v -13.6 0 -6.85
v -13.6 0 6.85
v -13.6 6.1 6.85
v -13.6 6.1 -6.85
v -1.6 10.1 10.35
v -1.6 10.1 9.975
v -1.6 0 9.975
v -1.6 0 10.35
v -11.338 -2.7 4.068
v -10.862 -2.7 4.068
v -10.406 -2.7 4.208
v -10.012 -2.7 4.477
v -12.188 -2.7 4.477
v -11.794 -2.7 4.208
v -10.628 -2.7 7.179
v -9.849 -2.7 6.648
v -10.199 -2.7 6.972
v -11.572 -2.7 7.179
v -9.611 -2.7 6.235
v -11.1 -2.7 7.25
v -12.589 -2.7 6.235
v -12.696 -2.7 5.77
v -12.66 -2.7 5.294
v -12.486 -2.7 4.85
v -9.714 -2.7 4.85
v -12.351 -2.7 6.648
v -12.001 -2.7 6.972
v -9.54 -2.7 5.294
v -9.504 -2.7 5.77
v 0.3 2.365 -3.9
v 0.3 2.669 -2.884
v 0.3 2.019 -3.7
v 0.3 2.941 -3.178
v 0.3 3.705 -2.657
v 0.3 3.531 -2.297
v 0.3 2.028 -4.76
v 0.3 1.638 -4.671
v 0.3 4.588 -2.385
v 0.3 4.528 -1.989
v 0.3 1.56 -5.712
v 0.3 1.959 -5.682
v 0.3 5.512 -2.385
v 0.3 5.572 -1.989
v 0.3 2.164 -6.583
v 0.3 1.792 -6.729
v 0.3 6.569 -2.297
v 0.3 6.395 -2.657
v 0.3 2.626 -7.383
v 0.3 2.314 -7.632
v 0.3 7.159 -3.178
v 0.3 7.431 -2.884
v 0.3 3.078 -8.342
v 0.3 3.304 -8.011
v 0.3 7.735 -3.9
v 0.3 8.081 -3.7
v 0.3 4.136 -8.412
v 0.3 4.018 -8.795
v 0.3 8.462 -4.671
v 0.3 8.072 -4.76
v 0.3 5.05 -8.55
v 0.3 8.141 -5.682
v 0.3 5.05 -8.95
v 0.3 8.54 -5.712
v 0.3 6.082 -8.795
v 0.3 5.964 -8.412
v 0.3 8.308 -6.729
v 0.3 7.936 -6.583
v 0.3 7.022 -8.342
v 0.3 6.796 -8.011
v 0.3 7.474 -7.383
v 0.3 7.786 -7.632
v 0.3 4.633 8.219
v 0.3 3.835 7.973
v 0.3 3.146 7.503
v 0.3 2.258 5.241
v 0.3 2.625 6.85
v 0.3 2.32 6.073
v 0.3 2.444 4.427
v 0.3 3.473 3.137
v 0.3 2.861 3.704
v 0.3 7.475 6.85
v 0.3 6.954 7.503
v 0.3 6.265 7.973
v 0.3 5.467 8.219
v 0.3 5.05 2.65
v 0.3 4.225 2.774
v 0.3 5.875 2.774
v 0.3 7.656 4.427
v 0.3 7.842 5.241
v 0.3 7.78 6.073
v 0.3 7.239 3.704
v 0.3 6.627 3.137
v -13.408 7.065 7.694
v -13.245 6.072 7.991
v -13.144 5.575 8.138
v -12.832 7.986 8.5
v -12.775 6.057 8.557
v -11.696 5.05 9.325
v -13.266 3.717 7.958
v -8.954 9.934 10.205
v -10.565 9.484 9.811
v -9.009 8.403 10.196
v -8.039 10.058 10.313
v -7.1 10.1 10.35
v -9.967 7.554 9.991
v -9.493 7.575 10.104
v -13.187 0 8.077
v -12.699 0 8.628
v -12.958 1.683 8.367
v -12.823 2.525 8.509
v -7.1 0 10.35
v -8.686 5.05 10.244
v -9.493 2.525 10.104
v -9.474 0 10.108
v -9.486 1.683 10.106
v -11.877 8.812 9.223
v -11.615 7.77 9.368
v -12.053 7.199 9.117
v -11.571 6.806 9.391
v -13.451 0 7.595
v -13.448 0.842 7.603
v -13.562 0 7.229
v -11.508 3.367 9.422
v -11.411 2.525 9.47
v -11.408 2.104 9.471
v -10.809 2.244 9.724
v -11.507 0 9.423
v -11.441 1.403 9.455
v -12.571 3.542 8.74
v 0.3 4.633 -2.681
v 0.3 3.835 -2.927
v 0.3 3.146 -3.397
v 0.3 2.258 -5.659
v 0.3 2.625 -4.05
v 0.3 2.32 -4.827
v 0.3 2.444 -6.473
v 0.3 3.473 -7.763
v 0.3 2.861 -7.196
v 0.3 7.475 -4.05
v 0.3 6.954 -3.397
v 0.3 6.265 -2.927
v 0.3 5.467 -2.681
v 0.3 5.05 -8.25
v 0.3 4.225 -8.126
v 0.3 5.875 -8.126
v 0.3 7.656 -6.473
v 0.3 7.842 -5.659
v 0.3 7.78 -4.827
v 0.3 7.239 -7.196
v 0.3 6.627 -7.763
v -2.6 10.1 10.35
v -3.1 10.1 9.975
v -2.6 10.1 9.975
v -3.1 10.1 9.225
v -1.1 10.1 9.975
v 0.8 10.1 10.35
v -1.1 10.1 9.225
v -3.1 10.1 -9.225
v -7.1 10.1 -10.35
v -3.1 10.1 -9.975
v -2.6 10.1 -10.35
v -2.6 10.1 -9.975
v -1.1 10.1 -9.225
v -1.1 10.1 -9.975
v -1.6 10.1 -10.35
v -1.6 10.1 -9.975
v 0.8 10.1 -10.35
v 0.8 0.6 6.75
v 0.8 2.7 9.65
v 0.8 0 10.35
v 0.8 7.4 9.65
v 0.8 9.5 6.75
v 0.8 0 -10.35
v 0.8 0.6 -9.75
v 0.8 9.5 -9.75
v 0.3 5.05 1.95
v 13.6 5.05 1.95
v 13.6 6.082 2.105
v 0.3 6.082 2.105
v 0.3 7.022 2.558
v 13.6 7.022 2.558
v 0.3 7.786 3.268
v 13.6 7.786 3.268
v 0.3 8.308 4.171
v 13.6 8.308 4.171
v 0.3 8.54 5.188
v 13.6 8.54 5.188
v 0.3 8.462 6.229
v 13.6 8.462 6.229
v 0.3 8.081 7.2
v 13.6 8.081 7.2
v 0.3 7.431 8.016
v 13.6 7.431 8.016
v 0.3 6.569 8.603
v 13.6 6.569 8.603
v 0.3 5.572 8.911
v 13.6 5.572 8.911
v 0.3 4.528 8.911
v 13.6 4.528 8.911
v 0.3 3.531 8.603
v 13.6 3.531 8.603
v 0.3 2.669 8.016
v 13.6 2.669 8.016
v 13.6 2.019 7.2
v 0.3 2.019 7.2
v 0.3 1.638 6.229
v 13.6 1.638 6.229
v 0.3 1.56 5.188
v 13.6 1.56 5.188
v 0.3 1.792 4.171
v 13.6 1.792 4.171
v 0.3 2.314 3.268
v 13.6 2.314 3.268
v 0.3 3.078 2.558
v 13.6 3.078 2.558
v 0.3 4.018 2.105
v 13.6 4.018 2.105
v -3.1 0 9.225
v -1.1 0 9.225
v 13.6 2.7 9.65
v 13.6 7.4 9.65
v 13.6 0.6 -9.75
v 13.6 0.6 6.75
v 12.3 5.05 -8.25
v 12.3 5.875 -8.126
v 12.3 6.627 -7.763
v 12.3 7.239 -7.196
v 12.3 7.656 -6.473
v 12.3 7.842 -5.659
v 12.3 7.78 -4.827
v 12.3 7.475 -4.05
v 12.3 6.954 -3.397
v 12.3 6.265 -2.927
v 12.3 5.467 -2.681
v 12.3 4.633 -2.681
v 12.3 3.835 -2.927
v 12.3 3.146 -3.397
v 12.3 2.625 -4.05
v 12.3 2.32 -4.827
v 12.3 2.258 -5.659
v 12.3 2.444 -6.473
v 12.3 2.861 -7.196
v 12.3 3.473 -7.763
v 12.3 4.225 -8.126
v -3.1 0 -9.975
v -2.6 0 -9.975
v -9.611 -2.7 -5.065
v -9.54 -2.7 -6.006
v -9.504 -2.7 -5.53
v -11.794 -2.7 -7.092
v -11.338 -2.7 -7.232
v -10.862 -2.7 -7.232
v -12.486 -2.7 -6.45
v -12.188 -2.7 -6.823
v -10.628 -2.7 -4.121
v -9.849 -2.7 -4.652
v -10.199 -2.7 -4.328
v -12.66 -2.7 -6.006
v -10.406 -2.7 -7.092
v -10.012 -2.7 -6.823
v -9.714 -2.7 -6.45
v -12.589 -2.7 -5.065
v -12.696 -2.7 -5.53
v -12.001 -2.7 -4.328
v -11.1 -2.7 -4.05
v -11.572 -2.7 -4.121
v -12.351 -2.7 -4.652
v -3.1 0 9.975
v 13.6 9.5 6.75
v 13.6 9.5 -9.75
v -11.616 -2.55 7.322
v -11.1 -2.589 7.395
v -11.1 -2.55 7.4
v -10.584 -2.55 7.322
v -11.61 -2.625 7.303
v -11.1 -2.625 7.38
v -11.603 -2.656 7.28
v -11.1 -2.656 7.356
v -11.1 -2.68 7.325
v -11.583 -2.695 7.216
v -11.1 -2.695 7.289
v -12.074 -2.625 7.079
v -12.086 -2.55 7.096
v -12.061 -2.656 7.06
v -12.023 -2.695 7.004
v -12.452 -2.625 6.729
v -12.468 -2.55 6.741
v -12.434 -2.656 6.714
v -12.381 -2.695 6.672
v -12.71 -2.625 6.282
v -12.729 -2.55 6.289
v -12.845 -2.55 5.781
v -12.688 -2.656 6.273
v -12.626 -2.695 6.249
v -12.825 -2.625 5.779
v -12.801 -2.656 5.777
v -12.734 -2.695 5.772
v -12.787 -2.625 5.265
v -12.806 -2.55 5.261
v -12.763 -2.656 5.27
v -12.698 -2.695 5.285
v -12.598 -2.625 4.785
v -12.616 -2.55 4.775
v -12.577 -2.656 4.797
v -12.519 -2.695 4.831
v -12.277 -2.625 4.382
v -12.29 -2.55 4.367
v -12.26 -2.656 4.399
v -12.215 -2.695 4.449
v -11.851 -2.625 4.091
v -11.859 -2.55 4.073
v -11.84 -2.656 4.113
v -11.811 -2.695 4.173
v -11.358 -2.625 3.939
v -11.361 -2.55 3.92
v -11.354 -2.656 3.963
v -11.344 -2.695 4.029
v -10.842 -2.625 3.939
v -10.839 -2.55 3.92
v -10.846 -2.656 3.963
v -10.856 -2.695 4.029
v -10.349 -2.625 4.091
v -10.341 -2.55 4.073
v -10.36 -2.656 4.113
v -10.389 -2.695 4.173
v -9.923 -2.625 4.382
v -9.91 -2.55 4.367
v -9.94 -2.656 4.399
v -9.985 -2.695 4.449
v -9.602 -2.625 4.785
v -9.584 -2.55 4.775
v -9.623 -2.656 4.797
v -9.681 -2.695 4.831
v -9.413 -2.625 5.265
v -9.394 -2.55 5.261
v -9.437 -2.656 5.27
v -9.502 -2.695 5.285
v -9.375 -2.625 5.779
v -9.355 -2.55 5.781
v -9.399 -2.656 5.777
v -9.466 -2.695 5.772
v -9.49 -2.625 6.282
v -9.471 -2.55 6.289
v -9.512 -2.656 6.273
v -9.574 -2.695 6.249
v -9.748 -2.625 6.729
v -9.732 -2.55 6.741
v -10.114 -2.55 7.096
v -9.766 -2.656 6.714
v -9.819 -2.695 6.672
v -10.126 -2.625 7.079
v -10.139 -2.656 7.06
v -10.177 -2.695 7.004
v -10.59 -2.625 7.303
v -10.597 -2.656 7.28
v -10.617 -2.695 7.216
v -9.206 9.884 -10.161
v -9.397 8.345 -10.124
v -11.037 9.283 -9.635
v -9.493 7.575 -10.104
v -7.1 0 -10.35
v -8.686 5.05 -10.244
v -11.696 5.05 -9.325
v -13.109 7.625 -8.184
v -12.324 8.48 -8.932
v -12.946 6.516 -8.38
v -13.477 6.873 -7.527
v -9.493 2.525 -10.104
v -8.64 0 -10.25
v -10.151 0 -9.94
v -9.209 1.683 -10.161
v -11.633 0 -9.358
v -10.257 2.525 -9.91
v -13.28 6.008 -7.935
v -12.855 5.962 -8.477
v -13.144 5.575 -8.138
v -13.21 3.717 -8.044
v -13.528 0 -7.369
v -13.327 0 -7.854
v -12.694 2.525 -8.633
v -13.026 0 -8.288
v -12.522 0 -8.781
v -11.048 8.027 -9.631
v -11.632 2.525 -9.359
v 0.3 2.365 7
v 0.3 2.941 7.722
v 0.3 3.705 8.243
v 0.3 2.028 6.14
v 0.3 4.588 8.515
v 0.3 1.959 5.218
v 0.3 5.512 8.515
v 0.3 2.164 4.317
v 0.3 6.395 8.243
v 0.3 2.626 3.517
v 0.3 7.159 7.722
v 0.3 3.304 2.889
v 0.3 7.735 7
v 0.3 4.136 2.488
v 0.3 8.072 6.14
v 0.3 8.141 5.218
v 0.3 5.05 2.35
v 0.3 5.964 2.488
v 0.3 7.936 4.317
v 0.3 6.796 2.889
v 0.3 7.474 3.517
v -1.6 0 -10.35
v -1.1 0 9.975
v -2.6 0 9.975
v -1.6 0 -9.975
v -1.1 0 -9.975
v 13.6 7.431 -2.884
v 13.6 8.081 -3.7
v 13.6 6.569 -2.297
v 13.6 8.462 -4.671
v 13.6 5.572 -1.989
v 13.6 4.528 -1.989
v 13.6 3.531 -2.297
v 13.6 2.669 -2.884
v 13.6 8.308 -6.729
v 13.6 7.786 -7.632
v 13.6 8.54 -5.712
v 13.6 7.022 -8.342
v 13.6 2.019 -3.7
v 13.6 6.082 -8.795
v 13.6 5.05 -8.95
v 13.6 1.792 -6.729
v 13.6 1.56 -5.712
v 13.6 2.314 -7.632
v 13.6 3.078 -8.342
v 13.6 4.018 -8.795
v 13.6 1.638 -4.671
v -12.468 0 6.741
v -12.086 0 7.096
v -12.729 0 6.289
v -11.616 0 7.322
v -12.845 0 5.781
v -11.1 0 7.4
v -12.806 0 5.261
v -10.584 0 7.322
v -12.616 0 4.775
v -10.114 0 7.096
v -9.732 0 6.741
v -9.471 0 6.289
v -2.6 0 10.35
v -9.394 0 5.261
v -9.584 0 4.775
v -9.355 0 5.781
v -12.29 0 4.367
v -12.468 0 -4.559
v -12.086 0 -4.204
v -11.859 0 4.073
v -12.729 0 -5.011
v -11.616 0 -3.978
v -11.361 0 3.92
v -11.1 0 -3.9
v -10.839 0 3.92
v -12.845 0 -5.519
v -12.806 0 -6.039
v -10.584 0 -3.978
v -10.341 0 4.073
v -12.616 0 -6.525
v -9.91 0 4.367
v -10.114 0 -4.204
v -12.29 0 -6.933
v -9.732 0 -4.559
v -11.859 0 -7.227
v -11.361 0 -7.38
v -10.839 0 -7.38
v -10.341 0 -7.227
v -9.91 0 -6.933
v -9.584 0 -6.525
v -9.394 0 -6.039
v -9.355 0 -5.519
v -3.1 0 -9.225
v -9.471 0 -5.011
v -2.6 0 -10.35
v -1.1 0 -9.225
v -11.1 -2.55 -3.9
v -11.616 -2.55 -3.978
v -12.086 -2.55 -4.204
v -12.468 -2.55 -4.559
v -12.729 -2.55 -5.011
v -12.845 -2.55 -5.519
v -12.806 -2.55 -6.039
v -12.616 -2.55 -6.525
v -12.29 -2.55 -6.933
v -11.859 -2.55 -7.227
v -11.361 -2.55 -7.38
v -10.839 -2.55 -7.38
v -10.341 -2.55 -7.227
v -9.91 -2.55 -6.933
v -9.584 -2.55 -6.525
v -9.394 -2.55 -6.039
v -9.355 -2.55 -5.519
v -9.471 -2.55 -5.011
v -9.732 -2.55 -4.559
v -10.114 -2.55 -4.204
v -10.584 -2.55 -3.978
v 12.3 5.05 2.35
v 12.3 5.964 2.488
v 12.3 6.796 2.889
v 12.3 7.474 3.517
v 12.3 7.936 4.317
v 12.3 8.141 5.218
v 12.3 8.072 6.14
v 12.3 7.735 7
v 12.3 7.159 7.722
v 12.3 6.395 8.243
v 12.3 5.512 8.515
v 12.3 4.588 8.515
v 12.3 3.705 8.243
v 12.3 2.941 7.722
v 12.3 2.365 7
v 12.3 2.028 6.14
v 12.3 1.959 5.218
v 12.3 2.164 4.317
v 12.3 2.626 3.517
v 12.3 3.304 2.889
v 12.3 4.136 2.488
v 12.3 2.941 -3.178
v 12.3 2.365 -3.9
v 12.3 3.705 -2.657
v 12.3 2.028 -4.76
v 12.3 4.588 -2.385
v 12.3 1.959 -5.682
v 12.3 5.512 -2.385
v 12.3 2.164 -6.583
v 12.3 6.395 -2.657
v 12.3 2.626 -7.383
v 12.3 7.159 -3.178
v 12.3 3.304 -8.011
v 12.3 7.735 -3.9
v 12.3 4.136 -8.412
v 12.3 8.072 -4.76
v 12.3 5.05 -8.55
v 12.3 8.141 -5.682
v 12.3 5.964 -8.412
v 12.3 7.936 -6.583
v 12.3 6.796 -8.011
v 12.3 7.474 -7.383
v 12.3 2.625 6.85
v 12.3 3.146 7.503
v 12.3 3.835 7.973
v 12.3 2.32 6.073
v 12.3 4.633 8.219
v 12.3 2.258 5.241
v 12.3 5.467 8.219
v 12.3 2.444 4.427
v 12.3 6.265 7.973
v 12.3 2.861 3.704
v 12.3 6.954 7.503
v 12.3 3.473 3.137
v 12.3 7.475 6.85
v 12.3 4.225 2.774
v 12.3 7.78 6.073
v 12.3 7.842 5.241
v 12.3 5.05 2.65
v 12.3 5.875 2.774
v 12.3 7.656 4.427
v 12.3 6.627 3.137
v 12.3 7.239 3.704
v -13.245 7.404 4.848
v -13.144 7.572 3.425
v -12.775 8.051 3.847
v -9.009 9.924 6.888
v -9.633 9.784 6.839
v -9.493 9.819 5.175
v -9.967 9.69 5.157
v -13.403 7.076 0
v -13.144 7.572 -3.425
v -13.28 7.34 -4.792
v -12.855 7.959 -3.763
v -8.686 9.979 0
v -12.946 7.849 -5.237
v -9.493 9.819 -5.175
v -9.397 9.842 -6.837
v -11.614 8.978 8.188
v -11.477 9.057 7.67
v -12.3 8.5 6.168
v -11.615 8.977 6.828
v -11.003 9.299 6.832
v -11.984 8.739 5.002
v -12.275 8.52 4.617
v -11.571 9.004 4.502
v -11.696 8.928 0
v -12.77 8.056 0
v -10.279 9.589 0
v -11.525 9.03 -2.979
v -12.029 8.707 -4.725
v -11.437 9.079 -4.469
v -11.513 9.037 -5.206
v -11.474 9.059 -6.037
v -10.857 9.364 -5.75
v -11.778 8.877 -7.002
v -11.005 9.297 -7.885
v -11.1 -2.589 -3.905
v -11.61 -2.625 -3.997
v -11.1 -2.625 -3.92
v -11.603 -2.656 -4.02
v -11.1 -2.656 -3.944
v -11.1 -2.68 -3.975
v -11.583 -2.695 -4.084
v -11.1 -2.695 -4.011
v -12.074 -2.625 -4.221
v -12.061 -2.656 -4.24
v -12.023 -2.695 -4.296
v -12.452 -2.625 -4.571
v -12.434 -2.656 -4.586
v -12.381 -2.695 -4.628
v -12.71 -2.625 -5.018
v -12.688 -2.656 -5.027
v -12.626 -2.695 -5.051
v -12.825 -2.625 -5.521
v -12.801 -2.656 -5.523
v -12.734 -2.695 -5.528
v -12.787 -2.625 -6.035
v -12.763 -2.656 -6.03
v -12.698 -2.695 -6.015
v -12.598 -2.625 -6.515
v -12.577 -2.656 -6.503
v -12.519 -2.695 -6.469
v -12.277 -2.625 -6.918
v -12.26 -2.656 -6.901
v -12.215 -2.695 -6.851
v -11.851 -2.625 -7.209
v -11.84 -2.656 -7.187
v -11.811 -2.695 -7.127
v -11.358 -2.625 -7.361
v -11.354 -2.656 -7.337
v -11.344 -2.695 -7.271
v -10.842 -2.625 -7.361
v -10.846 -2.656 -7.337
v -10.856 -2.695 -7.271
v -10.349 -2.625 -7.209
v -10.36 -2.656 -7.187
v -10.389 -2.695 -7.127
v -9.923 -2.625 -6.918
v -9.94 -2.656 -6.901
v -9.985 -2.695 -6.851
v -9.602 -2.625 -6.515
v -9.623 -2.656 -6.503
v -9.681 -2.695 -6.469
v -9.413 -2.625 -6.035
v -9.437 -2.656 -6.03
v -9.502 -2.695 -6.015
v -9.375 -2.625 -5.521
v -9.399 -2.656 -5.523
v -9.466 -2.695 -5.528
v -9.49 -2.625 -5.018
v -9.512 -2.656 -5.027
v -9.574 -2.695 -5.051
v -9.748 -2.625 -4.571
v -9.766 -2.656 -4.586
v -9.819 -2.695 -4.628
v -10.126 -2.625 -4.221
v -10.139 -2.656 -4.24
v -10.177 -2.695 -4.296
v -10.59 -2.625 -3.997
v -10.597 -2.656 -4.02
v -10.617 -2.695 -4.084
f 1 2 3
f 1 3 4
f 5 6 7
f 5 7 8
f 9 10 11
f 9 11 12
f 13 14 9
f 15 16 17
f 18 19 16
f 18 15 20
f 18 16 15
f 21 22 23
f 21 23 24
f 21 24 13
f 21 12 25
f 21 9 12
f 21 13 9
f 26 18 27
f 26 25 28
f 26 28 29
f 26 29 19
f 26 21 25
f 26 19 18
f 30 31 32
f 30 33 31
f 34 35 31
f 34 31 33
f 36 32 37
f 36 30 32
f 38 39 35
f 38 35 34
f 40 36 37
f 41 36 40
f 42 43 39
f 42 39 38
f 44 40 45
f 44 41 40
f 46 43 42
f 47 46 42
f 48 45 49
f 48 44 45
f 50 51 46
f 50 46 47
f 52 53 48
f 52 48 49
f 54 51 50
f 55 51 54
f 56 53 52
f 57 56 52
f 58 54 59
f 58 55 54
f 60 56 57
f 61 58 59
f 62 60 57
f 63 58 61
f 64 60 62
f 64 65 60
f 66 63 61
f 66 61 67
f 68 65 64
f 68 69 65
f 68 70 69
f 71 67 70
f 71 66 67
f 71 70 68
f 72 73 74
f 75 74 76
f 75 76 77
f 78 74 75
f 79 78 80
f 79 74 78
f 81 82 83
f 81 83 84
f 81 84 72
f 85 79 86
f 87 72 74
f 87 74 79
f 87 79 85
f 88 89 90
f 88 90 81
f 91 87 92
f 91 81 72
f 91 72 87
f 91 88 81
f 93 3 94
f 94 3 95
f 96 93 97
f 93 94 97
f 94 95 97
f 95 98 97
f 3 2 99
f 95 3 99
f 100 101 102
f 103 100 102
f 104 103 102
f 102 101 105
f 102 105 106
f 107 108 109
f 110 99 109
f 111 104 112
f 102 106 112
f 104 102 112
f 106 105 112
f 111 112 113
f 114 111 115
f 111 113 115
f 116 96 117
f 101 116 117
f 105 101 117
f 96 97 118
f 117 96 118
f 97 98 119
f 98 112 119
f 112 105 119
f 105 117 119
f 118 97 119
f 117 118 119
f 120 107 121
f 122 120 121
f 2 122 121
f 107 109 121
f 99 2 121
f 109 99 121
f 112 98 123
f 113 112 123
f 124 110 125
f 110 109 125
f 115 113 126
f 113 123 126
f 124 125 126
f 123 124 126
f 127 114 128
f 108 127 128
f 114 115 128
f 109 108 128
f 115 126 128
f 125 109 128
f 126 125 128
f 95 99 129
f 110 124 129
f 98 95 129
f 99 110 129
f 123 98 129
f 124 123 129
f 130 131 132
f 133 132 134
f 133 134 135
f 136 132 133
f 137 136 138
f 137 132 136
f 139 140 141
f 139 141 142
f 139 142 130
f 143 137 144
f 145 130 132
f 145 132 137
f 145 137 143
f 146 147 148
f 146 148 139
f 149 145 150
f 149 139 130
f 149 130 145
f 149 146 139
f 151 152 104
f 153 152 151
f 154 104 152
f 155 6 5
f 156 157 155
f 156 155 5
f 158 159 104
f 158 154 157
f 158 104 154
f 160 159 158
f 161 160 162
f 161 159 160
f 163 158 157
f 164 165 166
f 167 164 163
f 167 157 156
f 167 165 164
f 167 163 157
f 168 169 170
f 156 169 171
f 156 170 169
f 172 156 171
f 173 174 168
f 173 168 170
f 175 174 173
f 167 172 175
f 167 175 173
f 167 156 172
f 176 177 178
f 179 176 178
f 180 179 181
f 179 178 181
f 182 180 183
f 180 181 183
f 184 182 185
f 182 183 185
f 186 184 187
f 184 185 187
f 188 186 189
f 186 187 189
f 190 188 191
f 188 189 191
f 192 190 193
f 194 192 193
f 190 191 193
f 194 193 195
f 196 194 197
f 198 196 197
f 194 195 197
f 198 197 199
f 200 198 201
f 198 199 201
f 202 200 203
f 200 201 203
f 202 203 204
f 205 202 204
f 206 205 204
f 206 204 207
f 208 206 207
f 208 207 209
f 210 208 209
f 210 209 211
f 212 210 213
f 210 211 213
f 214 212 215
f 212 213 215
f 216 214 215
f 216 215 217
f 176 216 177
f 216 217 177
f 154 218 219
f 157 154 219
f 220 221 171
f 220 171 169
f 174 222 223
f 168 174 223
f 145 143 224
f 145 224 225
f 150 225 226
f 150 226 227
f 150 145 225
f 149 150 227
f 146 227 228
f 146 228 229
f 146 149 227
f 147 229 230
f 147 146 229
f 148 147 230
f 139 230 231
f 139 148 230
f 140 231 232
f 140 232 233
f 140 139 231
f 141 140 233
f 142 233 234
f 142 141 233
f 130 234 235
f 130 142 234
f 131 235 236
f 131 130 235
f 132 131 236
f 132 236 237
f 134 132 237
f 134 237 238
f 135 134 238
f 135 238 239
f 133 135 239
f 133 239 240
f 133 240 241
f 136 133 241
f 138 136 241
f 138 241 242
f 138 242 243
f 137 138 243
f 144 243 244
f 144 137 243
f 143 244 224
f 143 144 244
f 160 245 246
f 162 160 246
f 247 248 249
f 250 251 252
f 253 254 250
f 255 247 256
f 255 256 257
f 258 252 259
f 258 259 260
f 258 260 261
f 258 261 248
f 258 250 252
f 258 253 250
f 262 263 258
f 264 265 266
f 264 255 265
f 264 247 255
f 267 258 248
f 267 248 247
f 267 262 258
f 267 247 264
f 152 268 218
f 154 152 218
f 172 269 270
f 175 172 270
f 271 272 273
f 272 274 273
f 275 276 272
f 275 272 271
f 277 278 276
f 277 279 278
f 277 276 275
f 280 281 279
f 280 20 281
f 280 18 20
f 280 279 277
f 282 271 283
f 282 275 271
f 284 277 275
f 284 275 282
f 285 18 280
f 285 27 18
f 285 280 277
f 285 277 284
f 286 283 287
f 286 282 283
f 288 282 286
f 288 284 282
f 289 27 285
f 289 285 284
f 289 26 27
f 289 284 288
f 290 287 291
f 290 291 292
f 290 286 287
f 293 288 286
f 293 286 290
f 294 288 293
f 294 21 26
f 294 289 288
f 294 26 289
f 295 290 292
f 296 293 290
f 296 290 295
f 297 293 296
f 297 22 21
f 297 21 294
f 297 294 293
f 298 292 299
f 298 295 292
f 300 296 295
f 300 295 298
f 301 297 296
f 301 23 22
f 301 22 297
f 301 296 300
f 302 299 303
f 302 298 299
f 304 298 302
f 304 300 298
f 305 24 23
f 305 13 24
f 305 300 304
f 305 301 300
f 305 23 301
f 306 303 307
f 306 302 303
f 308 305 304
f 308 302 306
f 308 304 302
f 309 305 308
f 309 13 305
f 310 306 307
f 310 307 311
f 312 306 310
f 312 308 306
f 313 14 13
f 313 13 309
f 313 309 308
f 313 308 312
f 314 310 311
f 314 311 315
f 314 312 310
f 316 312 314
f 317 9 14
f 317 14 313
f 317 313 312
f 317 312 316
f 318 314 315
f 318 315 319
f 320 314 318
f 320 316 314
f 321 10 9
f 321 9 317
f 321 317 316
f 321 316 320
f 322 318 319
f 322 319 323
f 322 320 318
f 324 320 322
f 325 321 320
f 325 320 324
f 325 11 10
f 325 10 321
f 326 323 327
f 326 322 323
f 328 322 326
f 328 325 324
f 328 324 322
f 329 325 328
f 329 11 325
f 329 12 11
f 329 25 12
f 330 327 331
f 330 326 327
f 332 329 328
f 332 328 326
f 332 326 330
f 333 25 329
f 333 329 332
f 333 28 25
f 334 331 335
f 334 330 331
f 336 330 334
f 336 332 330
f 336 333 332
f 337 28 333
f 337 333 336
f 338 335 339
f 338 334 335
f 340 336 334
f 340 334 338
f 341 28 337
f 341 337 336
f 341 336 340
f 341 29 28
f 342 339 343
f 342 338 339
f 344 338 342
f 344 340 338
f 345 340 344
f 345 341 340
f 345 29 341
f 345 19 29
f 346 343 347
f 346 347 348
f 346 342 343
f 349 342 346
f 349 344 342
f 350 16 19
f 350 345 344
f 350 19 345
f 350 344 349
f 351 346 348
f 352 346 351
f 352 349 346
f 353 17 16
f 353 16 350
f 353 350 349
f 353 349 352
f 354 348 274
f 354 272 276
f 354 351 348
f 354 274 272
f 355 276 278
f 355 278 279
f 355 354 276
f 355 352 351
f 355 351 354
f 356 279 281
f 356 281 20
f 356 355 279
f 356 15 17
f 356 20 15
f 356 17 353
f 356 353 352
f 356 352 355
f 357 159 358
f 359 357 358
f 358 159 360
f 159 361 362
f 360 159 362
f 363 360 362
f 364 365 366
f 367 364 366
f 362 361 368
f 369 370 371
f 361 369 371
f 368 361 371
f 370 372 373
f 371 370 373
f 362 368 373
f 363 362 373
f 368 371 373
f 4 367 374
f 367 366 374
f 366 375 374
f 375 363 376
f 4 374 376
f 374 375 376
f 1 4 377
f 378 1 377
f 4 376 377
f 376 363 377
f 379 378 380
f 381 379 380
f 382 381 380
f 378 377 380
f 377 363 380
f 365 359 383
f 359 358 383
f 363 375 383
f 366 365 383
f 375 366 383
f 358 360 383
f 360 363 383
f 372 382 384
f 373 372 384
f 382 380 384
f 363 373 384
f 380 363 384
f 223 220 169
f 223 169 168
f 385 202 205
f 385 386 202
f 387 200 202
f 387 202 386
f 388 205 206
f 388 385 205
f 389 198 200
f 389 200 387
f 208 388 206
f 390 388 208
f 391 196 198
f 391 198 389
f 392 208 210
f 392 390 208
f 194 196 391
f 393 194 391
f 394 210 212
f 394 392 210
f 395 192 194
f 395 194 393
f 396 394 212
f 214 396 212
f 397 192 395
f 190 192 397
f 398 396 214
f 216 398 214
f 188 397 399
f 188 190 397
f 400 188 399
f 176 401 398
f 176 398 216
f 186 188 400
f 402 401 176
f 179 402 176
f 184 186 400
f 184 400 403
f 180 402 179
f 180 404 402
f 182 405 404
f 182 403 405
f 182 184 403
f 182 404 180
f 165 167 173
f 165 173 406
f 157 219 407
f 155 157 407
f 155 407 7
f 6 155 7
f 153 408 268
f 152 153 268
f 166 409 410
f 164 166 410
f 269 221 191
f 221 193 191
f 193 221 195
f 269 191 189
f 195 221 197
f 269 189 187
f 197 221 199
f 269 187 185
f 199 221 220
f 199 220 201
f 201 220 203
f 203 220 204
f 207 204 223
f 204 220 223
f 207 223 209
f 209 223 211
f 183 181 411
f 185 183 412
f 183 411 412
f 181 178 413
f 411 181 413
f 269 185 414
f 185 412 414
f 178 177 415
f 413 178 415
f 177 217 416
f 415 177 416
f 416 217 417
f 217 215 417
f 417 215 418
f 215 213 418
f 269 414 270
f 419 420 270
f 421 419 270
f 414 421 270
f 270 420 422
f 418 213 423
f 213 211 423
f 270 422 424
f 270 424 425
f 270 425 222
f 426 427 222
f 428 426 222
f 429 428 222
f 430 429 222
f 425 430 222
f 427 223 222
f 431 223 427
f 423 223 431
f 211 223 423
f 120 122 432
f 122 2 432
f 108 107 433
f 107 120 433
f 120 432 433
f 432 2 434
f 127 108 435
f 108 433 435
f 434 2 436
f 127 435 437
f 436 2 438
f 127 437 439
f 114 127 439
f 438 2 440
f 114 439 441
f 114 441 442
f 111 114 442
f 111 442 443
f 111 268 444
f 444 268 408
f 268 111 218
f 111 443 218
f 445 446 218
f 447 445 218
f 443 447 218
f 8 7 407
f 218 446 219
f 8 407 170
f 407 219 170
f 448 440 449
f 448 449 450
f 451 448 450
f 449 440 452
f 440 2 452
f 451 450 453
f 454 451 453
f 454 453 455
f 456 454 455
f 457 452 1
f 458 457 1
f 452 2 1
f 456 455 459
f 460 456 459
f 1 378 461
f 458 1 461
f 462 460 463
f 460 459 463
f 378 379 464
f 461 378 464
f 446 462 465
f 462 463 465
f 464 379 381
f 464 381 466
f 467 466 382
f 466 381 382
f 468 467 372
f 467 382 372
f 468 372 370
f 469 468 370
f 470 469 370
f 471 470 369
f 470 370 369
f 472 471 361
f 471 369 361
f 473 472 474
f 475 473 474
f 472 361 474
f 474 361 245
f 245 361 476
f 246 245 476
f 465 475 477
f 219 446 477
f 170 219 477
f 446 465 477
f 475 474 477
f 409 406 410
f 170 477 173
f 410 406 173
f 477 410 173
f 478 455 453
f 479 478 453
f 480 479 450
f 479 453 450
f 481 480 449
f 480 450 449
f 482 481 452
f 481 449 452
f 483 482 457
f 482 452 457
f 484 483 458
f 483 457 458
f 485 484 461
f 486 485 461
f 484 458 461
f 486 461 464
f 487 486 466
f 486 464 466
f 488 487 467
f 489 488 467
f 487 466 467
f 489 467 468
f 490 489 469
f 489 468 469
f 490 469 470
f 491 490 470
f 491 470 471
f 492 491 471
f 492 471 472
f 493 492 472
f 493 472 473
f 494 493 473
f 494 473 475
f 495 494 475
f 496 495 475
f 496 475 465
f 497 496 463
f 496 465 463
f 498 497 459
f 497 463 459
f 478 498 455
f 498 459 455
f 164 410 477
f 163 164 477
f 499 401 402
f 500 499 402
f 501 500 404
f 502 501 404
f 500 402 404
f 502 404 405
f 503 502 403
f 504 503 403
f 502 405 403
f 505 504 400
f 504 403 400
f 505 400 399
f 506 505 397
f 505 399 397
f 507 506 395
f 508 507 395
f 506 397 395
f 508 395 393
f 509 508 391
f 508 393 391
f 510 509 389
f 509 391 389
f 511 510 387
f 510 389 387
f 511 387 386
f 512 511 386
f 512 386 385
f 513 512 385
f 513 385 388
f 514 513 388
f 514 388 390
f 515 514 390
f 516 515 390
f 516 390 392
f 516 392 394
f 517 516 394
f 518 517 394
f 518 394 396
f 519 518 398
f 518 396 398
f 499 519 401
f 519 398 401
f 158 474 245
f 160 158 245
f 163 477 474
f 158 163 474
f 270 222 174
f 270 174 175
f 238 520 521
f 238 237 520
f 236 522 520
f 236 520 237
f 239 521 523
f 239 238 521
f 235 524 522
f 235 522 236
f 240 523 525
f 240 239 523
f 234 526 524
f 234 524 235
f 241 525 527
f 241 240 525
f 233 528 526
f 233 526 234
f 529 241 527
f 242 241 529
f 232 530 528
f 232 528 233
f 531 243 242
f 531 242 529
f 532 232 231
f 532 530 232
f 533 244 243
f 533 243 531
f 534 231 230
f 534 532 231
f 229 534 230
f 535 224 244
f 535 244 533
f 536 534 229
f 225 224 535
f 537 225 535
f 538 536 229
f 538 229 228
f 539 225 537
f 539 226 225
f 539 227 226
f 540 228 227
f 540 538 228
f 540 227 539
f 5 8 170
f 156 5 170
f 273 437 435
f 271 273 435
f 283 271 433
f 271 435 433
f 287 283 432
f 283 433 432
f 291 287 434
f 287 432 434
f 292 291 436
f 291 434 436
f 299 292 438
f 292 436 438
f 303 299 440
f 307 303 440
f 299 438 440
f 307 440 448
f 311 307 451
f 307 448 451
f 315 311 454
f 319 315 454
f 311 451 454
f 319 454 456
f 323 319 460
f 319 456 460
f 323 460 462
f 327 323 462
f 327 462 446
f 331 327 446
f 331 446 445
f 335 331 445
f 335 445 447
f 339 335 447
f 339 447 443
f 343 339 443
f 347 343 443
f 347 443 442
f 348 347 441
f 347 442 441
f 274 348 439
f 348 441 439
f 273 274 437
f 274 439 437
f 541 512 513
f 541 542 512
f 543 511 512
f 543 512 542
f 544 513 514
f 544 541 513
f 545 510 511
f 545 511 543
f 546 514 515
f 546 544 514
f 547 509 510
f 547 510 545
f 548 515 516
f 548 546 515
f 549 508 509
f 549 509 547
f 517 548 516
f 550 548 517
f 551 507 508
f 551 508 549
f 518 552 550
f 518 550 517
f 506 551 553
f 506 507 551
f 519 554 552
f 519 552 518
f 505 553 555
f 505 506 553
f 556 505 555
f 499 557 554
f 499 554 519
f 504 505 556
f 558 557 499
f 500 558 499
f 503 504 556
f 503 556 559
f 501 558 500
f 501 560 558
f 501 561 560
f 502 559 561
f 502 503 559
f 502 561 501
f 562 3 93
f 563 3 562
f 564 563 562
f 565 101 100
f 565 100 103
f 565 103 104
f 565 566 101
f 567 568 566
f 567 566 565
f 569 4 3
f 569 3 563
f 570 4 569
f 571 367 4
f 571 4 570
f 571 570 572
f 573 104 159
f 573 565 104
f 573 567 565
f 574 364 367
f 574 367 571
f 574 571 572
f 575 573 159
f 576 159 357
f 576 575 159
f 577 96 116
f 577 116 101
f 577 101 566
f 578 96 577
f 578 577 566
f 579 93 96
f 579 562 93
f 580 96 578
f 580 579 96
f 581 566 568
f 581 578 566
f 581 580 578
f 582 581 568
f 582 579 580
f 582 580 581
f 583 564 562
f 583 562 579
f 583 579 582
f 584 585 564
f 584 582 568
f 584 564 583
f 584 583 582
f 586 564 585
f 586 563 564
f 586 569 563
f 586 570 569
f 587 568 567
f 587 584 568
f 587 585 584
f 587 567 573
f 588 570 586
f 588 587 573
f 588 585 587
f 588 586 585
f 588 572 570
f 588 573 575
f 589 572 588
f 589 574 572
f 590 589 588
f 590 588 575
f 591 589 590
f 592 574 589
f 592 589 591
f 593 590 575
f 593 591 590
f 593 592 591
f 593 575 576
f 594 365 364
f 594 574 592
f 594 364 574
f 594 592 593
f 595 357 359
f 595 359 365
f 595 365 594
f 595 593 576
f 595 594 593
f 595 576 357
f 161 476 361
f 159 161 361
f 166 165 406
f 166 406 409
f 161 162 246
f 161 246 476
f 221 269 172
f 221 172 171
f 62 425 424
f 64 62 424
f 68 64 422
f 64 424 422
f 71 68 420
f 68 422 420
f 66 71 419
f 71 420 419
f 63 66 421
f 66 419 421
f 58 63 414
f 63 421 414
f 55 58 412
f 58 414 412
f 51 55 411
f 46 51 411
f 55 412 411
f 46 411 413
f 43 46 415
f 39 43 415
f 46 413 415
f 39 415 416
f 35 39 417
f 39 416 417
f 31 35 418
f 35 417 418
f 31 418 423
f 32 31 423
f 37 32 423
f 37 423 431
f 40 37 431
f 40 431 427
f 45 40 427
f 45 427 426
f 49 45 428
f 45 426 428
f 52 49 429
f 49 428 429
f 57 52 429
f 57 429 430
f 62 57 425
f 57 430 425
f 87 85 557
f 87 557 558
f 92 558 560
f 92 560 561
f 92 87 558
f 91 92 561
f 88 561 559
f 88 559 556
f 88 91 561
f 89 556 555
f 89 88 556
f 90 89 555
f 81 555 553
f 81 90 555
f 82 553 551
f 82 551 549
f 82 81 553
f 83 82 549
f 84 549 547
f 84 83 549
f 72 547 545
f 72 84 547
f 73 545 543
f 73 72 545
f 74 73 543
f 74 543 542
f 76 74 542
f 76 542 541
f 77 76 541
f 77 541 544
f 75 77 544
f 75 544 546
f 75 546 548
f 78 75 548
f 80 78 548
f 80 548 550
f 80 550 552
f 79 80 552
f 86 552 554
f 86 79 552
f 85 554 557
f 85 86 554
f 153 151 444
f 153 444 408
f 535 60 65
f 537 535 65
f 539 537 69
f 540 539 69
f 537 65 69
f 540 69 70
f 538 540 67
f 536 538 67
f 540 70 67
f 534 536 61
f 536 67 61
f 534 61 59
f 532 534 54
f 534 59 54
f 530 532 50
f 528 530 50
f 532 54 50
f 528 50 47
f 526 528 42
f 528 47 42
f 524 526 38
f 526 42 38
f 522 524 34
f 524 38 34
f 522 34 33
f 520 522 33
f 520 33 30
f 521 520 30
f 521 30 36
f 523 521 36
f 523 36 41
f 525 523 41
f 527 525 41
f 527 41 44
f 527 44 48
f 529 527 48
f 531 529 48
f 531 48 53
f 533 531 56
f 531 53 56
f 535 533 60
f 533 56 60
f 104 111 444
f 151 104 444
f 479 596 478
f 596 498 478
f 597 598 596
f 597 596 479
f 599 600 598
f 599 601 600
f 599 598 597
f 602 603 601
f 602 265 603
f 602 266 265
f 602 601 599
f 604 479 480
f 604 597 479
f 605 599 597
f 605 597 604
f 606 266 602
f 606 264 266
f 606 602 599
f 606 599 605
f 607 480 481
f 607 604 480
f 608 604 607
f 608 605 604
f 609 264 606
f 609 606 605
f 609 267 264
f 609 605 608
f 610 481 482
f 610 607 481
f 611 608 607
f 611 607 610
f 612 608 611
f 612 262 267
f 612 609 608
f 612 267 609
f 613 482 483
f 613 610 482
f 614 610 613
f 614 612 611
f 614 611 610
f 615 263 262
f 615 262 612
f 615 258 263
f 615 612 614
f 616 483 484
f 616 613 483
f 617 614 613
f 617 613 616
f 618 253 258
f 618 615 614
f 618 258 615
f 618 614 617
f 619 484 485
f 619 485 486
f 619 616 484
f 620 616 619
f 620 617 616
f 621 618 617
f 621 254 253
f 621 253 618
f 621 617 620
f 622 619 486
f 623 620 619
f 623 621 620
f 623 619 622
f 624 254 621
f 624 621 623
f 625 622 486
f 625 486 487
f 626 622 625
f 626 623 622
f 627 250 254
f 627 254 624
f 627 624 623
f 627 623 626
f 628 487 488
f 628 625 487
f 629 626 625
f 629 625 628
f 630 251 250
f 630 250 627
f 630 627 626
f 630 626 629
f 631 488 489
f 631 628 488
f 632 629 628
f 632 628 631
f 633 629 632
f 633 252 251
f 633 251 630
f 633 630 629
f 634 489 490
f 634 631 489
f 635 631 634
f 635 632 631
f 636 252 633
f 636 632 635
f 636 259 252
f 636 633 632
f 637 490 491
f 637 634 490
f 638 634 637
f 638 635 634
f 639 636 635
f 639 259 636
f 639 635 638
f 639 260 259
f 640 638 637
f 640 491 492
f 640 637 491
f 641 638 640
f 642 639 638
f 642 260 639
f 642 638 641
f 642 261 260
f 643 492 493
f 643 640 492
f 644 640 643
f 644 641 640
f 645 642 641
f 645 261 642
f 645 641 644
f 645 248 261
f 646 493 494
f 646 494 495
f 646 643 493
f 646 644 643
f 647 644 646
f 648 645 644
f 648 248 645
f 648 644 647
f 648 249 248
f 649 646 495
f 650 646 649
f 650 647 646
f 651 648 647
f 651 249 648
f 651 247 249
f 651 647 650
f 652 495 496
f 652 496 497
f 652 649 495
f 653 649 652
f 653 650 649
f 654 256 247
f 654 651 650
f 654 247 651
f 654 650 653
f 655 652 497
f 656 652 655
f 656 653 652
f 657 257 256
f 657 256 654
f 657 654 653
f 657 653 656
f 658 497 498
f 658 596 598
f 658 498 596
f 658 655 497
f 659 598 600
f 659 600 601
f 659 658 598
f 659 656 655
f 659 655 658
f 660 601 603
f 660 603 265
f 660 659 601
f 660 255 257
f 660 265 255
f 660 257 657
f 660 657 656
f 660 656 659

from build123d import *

# Parameters (mm, degrees)
SKETCH1_W           = 6.5
SKETCH1_H           = 20.7
BOSS_EXTRUDE1_DEPTH = 10.1
FILLET1_SIZE        = 4
FILLET1_SIZE_2      = 6.5
FILLET2_SIZE        = 3.5
FILLET2_SIZE_2      = 6.5
SKETCH4_R           = 1.75
BOSS_EXTRUDE3_DEPTH = 2.7
FILLET4_R           = 0.15
SKETCH2_W           = 20.7
SKETCH2_H           = 10.1
CUT_EXTRUDE1_DEPTH  = 12.8
SKETCH5_R           = 3.5
CUT_EXTRUDE2_DEPTH  = 13.3
SKETCH6_R           = 3.1
SKETCH6_R_2         = 2.8
BOSS_EXTRUDE4_DEPTH = 12


with BuildPart() as part:
    # Sketch1 → Boss-Extrude1 (new body)
    with BuildSketch(Plane(origin=(0, 0, 0), x_dir=(1, 0, 0), z_dir=(0, 1, 0))):
        Polygon((-2.6, 10.35), (-7.1, 10.35), (-7.1, -10.35), (-2.6, -10.35), (-2.6, -9.975), (-3.1, -9.975), (-3.1, -9.225), (-1.1, -9.225), (-1.1, -9.975), (-1.6, -9.975), (-1.6, -10.35), (13.6, -10.35), (13.6, 10.35), (-1.6, 10.35), (-1.6, 9.975), (-1.1, 9.975), (-1.1, 9.225), (-3.1, 9.225), (-3.1, 9.975), (-2.6, 9.975), align=None)
        with Locations((-10.35, 0)):
            Rectangle(SKETCH1_W, SKETCH1_H)
    extrude(amount=BOSS_EXTRUDE1_DEPTH)

    # Fillet1
    # a fillet whose section is not a circle: 6.5, 4 mm, written as the material it takes off along each edge
    with BuildSketch(Plane(origin=(-13.6, 10.1, -26.6), x_dir=(0, -1, 0), z_dir=(0, 0, 1))) as fillet1_piece_1:
        with BuildLine():
            Bezier((FILLET1_SIZE, 0), (0, 0), (0, FILLET1_SIZE_2), weights=[1, 0.707106781, 1])
            Line((0, FILLET1_SIZE_2), (0, 0))
            Line((0, 0), (FILLET1_SIZE, 0))
        make_face()
    extrude(amount=53.2, mode=Mode.SUBTRACT)

    # Fillet2
    # a fillet whose section is not a circle: 6.5, 3.5 mm, written as the material it takes off along each edge
    with BuildSketch(Plane(origin=(-13.6, -16.25, 10.35), x_dir=(0, 0, -1), z_dir=(0, 1, 0))) as fillet2_piece_1:
        with BuildLine():
            Bezier((FILLET2_SIZE, 0), (0, 0), (0, -FILLET2_SIZE_2), weights=[1, 0.707106781, 1])
            Line((0, -FILLET2_SIZE_2), (0, 0))
            Line((0, 0), (FILLET2_SIZE, 0))
        make_face()
    extrude(amount=38.6, mode=Mode.SUBTRACT)
    with BuildSketch(Plane(origin=(-13.6, -16.25, -10.35), x_dir=(1, 0, 0), z_dir=(0, 1, 0))) as fillet2_piece_2:
        with BuildLine():
            Bezier((FILLET2_SIZE_2, 0), (0, 0), (0, -FILLET2_SIZE), weights=[1, 0.707106781, 1])
            Line((0, -FILLET2_SIZE), (0, 0))
            Line((0, 0), (FILLET2_SIZE_2, 0))
        make_face()
    extrude(amount=38.6, mode=Mode.SUBTRACT)

    # Sketch4 → Boss-Extrude3 (add)
    with BuildSketch(Plane.XZ):
        with Locations(Location((-11.1, -5.65, 0), (0, 0, 90))):
            Circle(SKETCH4_R)
        with Locations(Location((-11.1, 5.65, 0), (0, 0, 90))):
            Circle(SKETCH4_R)
    extrude(amount=BOSS_EXTRUDE3_DEPTH)

    # Fillet4
    fillet4_edges = [part.edges().sort_by_distance(p)[0] for p in [
        (-11.1, -2.7, -7.4),
        (-11.1, -2.7, 3.9),
    ]]
    fillet(fillet4_edges, radius=FILLET4_R)

    # Sketch2 → Cut-Extrude1 (cut)
    with BuildSketch(Plane(origin=(13.6, 0, 0), x_dir=(0, 0, -1), z_dir=(1, 0, 0))):
        with Locations((0, 5.05)):
            Rectangle(SKETCH2_W, SKETCH2_H)
        Polygon((-9.65, 7.4), (-9.65, 2.7), (-6.75, 0.6), (6.85, 0.6), (9.75, 0.6), (9.75, 9.5), (6.85, 9.5), (-6.75, 9.5), align=None, mode=Mode.SUBTRACT)
    extrude(amount=-CUT_EXTRUDE1_DEPTH, mode=Mode.SUBTRACT)

    # Sketch5 → Cut-Extrude2 (cut)
    with BuildSketch(Plane(origin=(13.6, 0, 0), x_dir=(0, 0, -1), z_dir=(1, 0, 0))):
        with Locations((-5.45, 5.05)):
            Circle(SKETCH5_R)
        with Locations((5.45, 5.05)):
            Circle(SKETCH5_R)
    extrude(amount=-CUT_EXTRUDE2_DEPTH, mode=Mode.SUBTRACT)

    # Sketch6 → Boss-Extrude4 (add)
    # profile 1 of 2: a face of its own
    with BuildSketch(Plane(origin=(0.3, 0, 0), x_dir=(0, 0, -1), z_dir=(1, 0, 0))):
        with Locations((-5.45, 5.05)):
            Circle(SKETCH6_R)
        with Locations((-5.45, 5.05)):
            Circle(SKETCH6_R_2, mode=Mode.SUBTRACT)
    # profile 2 of 2: a face of its own
    with BuildSketch(Plane(origin=(0.3, 0, 0), x_dir=(0, 0, -1), z_dir=(1, 0, 0))):
        with Locations((5.45, 5.05)):
            Circle(SKETCH6_R)
        with Locations((5.45, 5.05)):
            Circle(SKETCH6_R_2, mode=Mode.SUBTRACT)
    extrude(amount=BOSS_EXTRUDE4_DEPTH)


solid = part.part
